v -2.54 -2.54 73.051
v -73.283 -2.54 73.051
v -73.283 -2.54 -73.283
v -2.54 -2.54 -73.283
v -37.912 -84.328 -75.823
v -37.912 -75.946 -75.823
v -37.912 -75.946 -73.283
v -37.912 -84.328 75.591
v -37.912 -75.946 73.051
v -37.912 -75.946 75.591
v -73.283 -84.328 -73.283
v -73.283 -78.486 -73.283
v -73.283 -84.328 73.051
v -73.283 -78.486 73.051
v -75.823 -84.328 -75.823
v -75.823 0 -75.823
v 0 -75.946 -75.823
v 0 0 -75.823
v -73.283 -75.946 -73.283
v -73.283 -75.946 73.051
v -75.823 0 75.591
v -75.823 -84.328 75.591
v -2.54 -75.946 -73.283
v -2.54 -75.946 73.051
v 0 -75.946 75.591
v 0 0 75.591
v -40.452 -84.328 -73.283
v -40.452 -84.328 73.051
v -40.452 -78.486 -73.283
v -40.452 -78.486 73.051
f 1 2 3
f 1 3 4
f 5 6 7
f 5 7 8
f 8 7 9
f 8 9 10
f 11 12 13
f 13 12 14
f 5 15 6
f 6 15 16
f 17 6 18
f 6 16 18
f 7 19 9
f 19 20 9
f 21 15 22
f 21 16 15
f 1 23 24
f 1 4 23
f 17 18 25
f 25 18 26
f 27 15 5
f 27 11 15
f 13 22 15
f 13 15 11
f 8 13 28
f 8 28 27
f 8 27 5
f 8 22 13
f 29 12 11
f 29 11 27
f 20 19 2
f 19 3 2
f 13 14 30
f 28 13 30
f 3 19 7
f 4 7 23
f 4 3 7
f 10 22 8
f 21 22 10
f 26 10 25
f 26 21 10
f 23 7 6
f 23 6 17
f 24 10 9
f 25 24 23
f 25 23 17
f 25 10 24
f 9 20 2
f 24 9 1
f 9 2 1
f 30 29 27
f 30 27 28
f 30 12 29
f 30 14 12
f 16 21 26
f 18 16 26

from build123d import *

# Parameters (mm, degrees)
F0_W         = 75.8234336972
F0_H         = 151.4142677188
F1_DEPTH     = 75.946
F3_T         = -2.54
F2_W         = 37.9117168486
F2_H         = 151.4142677188
F4_DEPTH     = 8.382
F5_T         = 2.54
F5_T3_DEPTH  = 7.62
F5_T5_DEPTH  = 7.62
F5_T7_DEPTH  = 40.4517168486
F5_T9_DEPTH  = 151.4142677188
F5_T11_DEPTH = 78.486
F5_T13_DEPTH = 75.8234336972


# Not quite as in the source:
# - a shell that OpenCascade refuses in one call is made with other operations: the cavity is built on its own and cut out


with BuildPart() as f1:
    # F0 (on Front) → F1 (new body)
    with BuildSketch(Plane.XZ):
        with Locations((-37.9117168486, -0.1162923872)):
            Rectangle(F0_W, F0_H)
    extrude(amount=F1_DEPTH)

    # F3
    f3_openings = [f1.faces().sort_by_distance(p)[0] for p in [
        (-37.911717, -75.946, -0.116292),
    ]]
    offset(amount=F3_T, openings=f3_openings)

    # F2 (on face) → F4 (join)
    with BuildSketch(Plane.XZ.offset(75.946)):
        with Locations((-56.8675752729, -0.1162923872)):
            Rectangle(F2_W, F2_H)
    extrude(amount=F4_DEPTH)

    # F5: shell of thickness 2.54, made by hand


with BuildPart() as f5_core1:
    # F5_t2: copy of F1
    add(f1.part)

    # the walls: a layer under each face that stays
    f5_faces = [f5_core1.faces().sort_by_distance(p)[0] for p in [
        (-37.9117168486, -42.164, 75.5908414721),
        (-37.9117168486, 0, -0.1162923872),
        (-37.9117168486, -42.164, -75.8234262466),
        (-75.8234336972, -42.164, -0.1162923872),
        (-37.9117168486, -80.137, -0.1162923872),
        (-55.5975752729, -75.946, -0.1162923872),
        (-37.9117168486, -39.243, 73.0508414721),
        (-2.54, -39.243, -0.1162923872),
        (-37.9117168486, -2.54, -0.1162923872),
        (-73.2834336972, -39.243, -0.1162923872),
        (-37.9117168486, -39.243, -73.2834262466),
        (-1.263723895, -75.946, -70.7762839894),
        (0, -37.973, -0.1162923872),
    ]]
    thicken(f5_faces, amount=-F5_T, mode=Mode.SUBTRACT)

    # F5_s4 → F5_t3 (cut)
    with BuildSketch(Plane.XY.offset(-78.3634262466)):
        Polygon((-37.8863168486, -75.9714), (-40.4517168486, -75.946), (-40.4517168486, -73.406), (-37.9117168486, -73.406), align=None)
    extrude(amount=F5_T3_DEPTH, mode=Mode.SUBTRACT)

    # F5_s6 → F5_t5 (cut)
    with BuildSketch(Plane.XY.offset(70.5108414721)):
        Polygon((-37.8863168486, -75.9714), (-40.4517168486, -75.946), (-40.4517168486, -73.406), (-37.9117168486, -73.406), align=None)
    extrude(amount=F5_T5_DEPTH, mode=Mode.SUBTRACT)

    # F5_s8 → F5_t7 (cut)
    with BuildSketch(Plane.YZ.offset(-75.8234336972)):
        Polygon((-75.9206, -73.2580262466), (-78.486, -73.2834262466), (-78.486, -75.8234262466), (-75.946, -75.8234262466), align=None)
        Polygon((-75.9206, 73.0254414721), (-78.486, 73.0508414721), (-78.486, 75.5908414721), (-75.946, 75.5908414721), align=None)
    extrude(amount=F5_T7_DEPTH, mode=Mode.SUBTRACT)

    # F5_s10 → F5_t9 (cut)
    with BuildSketch(Plane.XY.offset(-75.8234262466)):
        Polygon((-73.2580336972, -75.9206), (-73.2834336972, -78.486), (-75.8234336972, -78.486), (-75.8234336972, -75.946), align=None)
        Polygon((-2.5654, -2.5654), (0, -2.54), (0, 0), (-2.54, 0), align=None)
        Polygon((-73.2580336972, -2.5654), (-73.2834336972, 0), (-75.8234336972, 0), (-75.8234336972, -2.54), align=None)
    extrude(amount=F5_T9_DEPTH, mode=Mode.SUBTRACT)

    # F5_s12 → F5_t11 (cut)
    with BuildSketch(Plane.XZ):
        Polygon((-73.2580336972, 73.0254414721), (-73.2834336972, 75.5908414721), (-75.8234336972, 75.5908414721), (-75.8234336972, 73.0508414721), align=None)
        Polygon((-2.5654, 73.0254414721), (-2.54, 75.5908414721), (0, 75.5908414721), (0, 73.0508414721), align=None)
        Polygon((-2.5654, -73.2580262466), (0, -73.2834262466), (0, -75.8234262466), (-2.54, -75.8234262466), align=None)
        Polygon((-73.2580336972, -73.2580262466), (-75.8234336972, -73.2834262466), (-75.8234336972, -75.8234262466), (-73.2834336972, -75.8234262466), align=None)
    extrude(amount=F5_T11_DEPTH, mode=Mode.SUBTRACT)

    # F5_s14 → F5_t13 (cut)
    with BuildSketch(Plane.YZ.offset(-75.8234336972)):
        Polygon((-2.5654, 73.0254414721), (-2.54, 75.5908414721), (0, 75.5908414721), (0, 73.0508414721), align=None)
        Polygon((-2.5654, -73.2580262466), (0, -73.2834262466), (0, -75.8234262466), (-2.54, -75.8234262466), align=None)
    extrude(amount=F5_T13_DEPTH, mode=Mode.SUBTRACT)


with BuildPart() as f1_1:
    add(f1.part)

    # what is left inside the walls is the cavity
    f5_cavity = [f5_core1.part.solids().sort_by_distance(p)[0] for p in [
        (-56.867575, -78.5114, -24.505337),
    ]]
    add(f5_cavity, mode=Mode.SUBTRACT)


solid = f1_1.part
